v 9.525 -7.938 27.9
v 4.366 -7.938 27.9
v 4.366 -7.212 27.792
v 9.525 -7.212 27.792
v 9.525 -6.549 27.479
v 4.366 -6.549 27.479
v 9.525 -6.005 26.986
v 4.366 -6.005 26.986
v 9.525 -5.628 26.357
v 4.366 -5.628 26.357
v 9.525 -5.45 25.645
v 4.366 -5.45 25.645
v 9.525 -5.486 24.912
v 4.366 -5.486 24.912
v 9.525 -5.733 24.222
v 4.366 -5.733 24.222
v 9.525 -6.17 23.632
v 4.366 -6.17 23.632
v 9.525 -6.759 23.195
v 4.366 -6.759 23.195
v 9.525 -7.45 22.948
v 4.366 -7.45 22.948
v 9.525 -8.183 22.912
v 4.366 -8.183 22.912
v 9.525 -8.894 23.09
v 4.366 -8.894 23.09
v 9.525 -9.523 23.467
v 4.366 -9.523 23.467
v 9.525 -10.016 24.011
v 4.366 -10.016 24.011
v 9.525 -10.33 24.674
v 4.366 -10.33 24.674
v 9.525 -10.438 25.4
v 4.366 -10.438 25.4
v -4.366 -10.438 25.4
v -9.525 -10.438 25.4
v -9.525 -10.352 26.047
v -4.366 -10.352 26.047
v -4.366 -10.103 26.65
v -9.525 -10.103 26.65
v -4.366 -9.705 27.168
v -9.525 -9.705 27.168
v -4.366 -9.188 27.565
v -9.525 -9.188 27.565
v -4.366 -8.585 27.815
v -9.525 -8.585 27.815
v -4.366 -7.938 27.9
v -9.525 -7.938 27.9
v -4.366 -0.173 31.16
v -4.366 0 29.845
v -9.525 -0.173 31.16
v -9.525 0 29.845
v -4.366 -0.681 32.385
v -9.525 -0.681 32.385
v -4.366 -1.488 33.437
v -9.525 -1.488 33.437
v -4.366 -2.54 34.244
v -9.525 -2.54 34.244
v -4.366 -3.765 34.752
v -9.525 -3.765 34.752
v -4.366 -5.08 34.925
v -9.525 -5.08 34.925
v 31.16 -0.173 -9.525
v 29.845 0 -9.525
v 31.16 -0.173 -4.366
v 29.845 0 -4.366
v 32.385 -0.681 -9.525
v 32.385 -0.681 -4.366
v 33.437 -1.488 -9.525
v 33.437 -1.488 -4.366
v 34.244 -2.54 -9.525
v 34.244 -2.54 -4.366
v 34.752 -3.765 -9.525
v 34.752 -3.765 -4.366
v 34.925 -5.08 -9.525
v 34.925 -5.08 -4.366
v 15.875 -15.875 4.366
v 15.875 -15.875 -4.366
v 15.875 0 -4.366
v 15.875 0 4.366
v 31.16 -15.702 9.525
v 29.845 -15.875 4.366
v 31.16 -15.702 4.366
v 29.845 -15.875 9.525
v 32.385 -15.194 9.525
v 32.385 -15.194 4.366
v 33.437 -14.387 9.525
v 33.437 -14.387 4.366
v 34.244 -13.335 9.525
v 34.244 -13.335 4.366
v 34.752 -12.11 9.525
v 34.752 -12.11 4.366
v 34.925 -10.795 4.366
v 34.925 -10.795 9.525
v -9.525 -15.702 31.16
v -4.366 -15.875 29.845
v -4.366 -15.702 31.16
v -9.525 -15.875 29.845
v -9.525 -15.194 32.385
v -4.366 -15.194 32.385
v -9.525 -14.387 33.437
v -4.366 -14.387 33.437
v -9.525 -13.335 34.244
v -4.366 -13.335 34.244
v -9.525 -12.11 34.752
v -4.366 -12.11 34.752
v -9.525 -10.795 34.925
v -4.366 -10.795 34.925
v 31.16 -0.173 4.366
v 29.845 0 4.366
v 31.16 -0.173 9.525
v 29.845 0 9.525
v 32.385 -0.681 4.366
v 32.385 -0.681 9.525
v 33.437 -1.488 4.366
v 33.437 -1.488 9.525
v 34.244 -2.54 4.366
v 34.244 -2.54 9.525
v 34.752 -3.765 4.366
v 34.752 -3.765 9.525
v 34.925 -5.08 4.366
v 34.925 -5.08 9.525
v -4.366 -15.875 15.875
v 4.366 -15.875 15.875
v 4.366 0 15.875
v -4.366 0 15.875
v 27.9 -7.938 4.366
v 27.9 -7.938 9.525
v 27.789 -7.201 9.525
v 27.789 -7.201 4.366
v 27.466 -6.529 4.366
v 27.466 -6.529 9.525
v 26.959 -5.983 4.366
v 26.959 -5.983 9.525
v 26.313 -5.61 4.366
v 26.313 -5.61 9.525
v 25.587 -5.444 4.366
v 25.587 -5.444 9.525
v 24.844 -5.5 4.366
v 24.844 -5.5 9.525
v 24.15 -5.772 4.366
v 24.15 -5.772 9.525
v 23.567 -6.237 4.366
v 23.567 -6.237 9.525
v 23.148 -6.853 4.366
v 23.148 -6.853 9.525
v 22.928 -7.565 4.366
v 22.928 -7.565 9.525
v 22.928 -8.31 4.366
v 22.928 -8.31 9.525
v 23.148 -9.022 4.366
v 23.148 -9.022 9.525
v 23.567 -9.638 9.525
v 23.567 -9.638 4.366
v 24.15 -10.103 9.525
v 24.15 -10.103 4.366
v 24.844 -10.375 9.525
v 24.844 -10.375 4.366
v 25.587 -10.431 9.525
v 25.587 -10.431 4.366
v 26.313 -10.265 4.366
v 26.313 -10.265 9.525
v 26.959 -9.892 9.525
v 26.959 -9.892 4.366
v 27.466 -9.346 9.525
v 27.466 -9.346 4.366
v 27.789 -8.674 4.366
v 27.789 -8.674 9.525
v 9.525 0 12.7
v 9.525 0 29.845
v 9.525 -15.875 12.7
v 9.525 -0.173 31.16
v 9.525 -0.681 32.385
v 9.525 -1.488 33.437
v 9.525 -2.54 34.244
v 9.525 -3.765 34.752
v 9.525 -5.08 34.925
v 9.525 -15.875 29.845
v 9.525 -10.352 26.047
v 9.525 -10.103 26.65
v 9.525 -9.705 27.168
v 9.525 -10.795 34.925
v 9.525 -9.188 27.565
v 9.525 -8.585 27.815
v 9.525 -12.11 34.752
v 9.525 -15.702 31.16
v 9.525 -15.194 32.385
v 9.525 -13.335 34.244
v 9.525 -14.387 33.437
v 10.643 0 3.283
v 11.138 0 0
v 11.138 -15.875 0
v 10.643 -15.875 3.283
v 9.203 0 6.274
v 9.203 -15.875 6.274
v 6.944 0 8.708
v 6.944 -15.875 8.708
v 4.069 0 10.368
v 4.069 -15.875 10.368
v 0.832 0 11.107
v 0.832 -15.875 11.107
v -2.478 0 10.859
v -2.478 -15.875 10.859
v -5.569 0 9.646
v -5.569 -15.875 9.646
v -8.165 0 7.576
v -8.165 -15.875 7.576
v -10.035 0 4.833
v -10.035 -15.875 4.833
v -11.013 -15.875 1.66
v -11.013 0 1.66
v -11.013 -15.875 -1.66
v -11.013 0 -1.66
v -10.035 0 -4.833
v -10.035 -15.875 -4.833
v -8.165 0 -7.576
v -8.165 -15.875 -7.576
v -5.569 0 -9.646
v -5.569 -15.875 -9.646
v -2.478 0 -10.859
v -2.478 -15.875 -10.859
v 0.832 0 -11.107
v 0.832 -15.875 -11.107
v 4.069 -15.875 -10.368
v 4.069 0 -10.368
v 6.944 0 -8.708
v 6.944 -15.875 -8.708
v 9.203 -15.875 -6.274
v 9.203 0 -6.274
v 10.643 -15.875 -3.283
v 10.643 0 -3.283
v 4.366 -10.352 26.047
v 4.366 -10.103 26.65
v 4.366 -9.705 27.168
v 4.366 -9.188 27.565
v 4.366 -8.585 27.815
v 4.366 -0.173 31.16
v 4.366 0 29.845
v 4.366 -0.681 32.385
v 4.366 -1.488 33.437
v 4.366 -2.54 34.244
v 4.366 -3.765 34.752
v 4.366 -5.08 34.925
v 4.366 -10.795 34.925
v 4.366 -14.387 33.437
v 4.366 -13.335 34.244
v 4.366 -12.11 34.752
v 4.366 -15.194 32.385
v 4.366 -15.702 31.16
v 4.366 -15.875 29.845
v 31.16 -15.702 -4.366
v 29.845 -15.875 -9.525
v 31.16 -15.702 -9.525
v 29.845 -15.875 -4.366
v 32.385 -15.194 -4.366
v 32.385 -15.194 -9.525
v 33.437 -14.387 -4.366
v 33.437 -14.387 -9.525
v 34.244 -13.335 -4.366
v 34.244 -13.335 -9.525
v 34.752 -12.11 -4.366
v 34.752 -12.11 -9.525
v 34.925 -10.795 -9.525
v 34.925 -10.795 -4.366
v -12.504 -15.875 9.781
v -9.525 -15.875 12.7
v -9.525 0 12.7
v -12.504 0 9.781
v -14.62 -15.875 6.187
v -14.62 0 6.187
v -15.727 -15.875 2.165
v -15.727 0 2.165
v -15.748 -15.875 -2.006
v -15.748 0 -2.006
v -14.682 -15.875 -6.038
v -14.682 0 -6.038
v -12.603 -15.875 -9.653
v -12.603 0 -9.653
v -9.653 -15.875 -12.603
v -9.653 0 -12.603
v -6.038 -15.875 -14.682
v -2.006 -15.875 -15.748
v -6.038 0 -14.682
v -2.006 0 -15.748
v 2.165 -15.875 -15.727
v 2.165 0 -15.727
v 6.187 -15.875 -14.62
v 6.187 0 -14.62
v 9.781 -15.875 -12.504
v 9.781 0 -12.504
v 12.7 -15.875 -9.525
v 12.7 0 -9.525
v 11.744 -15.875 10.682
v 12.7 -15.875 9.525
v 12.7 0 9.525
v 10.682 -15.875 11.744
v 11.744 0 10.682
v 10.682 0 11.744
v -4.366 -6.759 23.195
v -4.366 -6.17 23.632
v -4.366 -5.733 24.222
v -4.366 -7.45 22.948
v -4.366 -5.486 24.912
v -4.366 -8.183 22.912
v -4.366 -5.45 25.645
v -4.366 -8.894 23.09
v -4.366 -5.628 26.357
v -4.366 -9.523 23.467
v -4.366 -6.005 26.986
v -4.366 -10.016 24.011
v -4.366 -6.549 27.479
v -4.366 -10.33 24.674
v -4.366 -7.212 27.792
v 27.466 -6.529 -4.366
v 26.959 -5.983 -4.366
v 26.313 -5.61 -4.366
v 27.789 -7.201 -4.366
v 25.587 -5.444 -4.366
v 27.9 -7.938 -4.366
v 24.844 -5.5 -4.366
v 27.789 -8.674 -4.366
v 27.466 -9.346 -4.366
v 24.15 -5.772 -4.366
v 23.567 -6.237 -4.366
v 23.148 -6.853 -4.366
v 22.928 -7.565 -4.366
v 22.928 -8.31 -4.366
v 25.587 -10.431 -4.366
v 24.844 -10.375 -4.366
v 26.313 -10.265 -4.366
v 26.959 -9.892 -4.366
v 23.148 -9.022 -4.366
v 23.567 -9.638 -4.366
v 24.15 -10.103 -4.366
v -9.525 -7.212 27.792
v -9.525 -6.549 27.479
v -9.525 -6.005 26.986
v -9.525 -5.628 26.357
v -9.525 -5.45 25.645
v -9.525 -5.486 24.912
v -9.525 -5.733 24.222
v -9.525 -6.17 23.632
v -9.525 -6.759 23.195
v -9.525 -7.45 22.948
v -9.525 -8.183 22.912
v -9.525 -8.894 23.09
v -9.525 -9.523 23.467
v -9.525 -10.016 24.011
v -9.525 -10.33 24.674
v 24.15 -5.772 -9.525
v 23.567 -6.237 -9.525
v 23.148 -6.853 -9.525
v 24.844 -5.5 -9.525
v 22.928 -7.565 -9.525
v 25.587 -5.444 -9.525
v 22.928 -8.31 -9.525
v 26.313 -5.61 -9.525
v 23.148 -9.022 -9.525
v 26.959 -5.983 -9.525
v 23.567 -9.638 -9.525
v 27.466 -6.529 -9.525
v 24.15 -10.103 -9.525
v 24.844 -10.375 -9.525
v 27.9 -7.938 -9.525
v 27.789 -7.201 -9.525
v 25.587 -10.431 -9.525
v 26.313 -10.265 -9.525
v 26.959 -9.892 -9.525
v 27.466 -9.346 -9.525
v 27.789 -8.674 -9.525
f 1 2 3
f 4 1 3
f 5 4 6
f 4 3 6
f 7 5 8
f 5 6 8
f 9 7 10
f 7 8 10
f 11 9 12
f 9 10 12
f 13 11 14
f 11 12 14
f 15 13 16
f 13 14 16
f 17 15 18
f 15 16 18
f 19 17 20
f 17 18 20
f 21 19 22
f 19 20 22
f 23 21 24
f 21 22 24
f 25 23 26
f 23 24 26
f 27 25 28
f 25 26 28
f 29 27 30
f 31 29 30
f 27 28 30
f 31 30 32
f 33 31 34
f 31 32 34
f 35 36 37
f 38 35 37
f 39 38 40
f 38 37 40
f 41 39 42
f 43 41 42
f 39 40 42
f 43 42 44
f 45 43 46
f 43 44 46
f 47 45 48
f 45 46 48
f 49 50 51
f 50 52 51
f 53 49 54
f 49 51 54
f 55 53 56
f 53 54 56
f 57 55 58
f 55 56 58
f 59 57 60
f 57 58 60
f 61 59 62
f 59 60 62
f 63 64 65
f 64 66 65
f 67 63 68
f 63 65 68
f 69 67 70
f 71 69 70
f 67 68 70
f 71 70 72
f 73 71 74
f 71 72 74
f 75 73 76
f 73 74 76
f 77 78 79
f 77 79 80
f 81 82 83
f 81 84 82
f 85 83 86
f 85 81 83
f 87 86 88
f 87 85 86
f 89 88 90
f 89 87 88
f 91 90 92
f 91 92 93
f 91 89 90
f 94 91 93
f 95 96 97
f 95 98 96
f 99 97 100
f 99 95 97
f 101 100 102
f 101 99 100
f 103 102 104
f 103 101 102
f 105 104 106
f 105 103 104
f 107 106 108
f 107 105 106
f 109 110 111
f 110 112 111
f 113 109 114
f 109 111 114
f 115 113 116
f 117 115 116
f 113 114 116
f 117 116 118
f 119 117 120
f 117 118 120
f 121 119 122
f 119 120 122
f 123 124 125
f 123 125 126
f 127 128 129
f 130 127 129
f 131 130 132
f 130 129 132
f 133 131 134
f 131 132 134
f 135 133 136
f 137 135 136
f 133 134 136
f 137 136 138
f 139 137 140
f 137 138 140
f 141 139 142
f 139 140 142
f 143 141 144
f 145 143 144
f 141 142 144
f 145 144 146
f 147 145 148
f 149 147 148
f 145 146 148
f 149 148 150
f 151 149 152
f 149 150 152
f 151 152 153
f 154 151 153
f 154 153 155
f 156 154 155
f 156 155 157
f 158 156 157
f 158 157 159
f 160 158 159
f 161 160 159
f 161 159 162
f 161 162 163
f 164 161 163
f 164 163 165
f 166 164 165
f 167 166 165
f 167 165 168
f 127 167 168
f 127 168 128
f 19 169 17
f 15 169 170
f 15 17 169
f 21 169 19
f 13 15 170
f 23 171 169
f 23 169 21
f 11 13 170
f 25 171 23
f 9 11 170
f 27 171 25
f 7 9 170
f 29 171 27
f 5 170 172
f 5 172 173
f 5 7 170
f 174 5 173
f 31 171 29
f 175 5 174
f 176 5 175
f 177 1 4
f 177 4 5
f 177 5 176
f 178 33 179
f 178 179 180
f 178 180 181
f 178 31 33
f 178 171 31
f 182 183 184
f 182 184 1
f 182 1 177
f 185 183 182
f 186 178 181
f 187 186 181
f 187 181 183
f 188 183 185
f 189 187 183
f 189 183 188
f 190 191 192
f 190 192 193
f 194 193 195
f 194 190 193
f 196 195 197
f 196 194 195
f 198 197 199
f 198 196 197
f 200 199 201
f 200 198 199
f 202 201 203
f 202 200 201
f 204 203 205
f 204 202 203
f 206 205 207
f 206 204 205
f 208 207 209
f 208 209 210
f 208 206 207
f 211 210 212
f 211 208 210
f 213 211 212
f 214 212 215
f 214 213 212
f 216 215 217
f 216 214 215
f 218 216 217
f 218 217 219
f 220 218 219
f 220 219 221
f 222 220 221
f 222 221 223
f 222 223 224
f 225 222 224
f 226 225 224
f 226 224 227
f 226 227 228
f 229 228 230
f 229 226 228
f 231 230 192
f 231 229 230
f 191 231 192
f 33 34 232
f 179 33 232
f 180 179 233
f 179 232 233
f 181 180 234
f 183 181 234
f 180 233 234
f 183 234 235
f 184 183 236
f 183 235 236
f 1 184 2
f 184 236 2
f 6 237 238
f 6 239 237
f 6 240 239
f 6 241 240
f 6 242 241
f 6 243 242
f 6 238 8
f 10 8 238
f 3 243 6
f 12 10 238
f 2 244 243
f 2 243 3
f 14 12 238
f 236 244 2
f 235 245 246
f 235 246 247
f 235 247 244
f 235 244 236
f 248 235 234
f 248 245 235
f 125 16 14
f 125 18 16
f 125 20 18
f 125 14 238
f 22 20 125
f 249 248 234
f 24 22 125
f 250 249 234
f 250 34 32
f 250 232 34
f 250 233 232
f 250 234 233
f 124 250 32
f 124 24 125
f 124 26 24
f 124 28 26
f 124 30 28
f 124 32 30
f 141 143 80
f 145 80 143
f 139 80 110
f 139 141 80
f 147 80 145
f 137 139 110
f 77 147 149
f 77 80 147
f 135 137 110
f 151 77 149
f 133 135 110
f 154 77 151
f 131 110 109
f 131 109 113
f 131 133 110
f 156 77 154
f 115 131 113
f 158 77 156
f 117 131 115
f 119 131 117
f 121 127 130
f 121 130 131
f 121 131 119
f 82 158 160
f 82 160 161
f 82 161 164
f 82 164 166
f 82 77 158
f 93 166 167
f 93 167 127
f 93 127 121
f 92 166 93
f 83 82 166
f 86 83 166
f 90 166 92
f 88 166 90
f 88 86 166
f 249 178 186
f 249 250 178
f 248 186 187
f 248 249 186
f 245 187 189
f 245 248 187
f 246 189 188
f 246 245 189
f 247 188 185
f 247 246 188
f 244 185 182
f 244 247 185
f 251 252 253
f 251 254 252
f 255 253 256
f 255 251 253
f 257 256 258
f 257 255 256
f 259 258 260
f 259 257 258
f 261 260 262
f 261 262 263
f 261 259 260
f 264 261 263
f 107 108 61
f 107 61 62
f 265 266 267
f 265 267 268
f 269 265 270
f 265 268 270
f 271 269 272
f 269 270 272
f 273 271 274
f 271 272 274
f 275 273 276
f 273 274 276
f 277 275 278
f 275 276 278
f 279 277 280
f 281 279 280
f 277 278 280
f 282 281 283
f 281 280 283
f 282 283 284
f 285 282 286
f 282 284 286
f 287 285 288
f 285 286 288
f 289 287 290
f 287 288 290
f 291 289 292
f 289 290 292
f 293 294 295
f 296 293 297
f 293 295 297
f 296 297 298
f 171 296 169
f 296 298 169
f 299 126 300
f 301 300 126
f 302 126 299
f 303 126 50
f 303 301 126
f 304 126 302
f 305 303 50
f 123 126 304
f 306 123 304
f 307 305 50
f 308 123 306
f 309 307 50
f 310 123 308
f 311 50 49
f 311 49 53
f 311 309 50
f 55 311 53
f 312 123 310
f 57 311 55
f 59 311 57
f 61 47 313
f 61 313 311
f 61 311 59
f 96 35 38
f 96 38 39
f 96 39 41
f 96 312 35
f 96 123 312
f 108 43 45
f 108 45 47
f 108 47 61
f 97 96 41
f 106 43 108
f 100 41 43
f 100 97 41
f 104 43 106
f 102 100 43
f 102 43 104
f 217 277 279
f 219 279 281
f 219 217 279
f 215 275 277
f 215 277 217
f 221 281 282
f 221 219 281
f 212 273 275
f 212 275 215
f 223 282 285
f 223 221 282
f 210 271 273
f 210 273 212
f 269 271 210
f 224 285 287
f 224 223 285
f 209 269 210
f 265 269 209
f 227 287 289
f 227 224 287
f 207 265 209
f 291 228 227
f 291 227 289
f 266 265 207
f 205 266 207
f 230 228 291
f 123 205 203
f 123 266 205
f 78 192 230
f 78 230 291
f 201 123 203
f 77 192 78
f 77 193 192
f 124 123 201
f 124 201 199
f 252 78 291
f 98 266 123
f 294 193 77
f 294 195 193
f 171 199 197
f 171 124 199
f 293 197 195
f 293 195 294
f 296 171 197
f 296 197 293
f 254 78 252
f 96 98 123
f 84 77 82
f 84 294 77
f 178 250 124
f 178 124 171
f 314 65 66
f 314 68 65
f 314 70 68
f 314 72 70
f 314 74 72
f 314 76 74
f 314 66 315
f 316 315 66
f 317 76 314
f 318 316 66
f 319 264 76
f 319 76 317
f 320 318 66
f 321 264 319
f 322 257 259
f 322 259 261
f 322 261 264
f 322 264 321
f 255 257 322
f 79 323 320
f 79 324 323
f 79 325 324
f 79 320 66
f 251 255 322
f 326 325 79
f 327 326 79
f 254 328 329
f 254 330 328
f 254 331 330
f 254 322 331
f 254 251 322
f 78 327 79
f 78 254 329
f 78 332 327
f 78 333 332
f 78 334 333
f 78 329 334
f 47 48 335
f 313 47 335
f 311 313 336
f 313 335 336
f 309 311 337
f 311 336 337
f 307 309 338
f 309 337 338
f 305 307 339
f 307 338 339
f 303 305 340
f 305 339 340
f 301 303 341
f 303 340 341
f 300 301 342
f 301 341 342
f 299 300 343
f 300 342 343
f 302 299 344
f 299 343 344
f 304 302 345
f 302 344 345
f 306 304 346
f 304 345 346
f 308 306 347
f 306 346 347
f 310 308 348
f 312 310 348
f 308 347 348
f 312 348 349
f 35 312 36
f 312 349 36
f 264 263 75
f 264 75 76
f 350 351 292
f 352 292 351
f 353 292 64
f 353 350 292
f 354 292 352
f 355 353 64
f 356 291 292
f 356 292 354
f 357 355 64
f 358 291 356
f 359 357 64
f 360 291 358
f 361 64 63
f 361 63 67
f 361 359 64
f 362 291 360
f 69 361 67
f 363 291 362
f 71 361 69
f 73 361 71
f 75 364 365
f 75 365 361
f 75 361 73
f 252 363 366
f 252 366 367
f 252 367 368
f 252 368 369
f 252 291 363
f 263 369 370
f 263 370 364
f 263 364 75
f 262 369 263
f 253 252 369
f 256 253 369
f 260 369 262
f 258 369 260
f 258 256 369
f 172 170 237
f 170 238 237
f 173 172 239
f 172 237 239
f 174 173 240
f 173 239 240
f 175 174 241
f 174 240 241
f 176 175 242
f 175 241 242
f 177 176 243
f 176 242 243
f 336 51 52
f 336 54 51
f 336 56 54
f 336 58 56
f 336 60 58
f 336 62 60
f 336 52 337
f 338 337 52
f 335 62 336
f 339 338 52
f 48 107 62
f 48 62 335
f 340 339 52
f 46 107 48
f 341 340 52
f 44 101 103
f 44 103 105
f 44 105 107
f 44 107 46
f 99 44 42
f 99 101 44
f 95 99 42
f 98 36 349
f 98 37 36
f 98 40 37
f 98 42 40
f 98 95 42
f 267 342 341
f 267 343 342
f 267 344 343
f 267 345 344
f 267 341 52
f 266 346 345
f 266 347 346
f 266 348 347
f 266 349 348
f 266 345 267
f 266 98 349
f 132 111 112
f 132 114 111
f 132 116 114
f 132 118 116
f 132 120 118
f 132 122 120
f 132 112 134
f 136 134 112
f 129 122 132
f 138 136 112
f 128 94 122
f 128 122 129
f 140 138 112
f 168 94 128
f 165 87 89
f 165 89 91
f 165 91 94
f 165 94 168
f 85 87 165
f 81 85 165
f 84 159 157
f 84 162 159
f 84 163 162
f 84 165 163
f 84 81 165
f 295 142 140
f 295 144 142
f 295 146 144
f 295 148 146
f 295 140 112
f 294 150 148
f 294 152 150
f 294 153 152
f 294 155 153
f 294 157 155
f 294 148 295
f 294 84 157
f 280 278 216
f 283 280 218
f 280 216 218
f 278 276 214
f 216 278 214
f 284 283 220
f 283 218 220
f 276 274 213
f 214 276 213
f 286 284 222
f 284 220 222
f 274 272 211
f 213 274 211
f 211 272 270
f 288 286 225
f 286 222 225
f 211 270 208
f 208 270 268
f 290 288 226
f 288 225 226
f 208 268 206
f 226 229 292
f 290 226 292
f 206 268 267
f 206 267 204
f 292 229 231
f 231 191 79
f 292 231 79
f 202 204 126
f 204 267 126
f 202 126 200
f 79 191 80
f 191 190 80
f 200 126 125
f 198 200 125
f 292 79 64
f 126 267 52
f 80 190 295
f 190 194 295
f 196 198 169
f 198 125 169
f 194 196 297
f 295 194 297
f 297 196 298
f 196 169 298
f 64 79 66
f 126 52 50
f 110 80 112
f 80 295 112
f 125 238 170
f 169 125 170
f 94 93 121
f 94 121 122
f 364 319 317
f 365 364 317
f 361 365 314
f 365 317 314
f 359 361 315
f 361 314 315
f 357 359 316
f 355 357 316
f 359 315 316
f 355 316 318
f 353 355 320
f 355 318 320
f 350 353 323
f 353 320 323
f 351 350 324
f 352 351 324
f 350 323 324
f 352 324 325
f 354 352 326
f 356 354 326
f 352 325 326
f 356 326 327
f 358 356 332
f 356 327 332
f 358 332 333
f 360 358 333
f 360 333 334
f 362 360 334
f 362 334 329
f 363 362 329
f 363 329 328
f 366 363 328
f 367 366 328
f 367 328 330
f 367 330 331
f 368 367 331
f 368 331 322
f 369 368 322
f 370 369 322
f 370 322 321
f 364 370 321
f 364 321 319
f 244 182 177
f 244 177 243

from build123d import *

# Parameters (mm, degrees)
F0_R     = 15.875
F0_R_2   = 11.1379
F1_DEPTH = 15.875
F3_DEPTH = 15.875
F4_R     = 11.1379
F5_DEPTH = 15.876
F6_R     = 2.5
F7_DEPTH = 25.401
F9_DEPTH = 44.451
F10_R    = 5.08


with BuildPart() as f1:
    # F0 (on Front) → F1 (new body)
    with BuildSketch(Plane.XZ):
        Circle(F0_R)
        Circle(F0_R_2, mode=Mode.SUBTRACT)
    extrude(amount=F1_DEPTH)

    # F2 (on face) → F3 (join, through all)
    with BuildSketch(Plane.XZ.offset(15.875)):
        with BuildLine():
            Line((-4.365625, 15.875), (-4.365625, 34.925))
            Line((-4.365625, 34.925), (-9.525, 34.925))
            Line((-9.525, 34.925), (-9.525, 12.7))
            ThreePointArc((-9.525, 12.7), (-5.0201157855, 15.0603473566), (0, 15.875))
            Line((0, 15.875), (-4.365625, 15.875))
        make_face()
        with BuildLine():
            Line((9.525, 12.7), (9.525, 34.925))
            Line((9.525, 34.925), (4.365625, 34.925))
            Line((4.365625, 34.925), (4.365625, 15.875))
            Line((4.365625, 15.875), (0, 15.875))
            ThreePointArc((0, 15.875), (5.0201157855, 15.0603473566), (9.525, 12.7))
        make_face()
        with BuildLine():
            Line((34.925, 9.525), (12.7, 9.525))
            ThreePointArc((12.7, 9.525), (15.0603473566, 5.0201157855), (15.875, 0))
            Line((15.875, 0), (15.875, 4.365625))
            Line((15.875, 4.365625), (34.925, 4.365625))
            Line((34.925, 4.365625), (34.925, 9.525))
        make_face()
        with BuildLine():
            Line((15.875, -4.365625), (15.875, 0))
            ThreePointArc((15.875, 0), (15.0603473566, -5.0201157855), (12.7, -9.525))
            Line((12.7, -9.525), (34.925, -9.525))
            Line((34.925, -9.525), (34.925, -4.365625))
            Line((34.925, -4.365625), (15.875, -4.365625))
        make_face()
    extrude(amount=-F3_DEPTH)

    # F4 (on Front) → F5 (cut, through all)
    with BuildSketch(Plane.XZ):
        Circle(F4_R)
    extrude(amount=F5_DEPTH, mode=Mode.SUBTRACT)

    # F6 (on face) → F7 (cut, through all)
    with BuildSketch(Plane.XY.offset(9.525)):
        with Locations((25.4, -7.9375)):
            Circle(F6_R)
    extrude(amount=-F7_DEPTH, mode=Mode.SUBTRACT)

    # F8 (on face) → F9 (cut, through all)
    with BuildSketch(Plane(origin=(-9.525, 0, 0), x_dir=(0, -1, 0), z_dir=(-1, 0, 0))):
        with BuildLine():
            ThreePointArc((7.9375, 27.9), (6.169733047, 23.632233047), (10.4375, 25.4))
            ThreePointArc((10.4375, 25.4), (9.705266953, 27.167766953), (7.9375, 27.9))
        make_face()
    extrude(amount=-F9_DEPTH, mode=Mode.SUBTRACT)

    # F10
    f10_edges = [f1.edges().sort_by_distance(p)[0] for p in [
        (-6.945312, 0, 34.925),
        (6.945312, 0, 34.925),
        (6.945312, -15.875, 34.925),
        (-6.945312, -15.875, 34.925),
        (34.925, 0, 6.945312),
        (34.925, 0, -6.945312),
        (34.925, -15.875, 6.945312),
        (34.925, -15.875, -6.945312),
    ]]
    fillet(f10_edges, radius=F10_R)


solid = f1.part
